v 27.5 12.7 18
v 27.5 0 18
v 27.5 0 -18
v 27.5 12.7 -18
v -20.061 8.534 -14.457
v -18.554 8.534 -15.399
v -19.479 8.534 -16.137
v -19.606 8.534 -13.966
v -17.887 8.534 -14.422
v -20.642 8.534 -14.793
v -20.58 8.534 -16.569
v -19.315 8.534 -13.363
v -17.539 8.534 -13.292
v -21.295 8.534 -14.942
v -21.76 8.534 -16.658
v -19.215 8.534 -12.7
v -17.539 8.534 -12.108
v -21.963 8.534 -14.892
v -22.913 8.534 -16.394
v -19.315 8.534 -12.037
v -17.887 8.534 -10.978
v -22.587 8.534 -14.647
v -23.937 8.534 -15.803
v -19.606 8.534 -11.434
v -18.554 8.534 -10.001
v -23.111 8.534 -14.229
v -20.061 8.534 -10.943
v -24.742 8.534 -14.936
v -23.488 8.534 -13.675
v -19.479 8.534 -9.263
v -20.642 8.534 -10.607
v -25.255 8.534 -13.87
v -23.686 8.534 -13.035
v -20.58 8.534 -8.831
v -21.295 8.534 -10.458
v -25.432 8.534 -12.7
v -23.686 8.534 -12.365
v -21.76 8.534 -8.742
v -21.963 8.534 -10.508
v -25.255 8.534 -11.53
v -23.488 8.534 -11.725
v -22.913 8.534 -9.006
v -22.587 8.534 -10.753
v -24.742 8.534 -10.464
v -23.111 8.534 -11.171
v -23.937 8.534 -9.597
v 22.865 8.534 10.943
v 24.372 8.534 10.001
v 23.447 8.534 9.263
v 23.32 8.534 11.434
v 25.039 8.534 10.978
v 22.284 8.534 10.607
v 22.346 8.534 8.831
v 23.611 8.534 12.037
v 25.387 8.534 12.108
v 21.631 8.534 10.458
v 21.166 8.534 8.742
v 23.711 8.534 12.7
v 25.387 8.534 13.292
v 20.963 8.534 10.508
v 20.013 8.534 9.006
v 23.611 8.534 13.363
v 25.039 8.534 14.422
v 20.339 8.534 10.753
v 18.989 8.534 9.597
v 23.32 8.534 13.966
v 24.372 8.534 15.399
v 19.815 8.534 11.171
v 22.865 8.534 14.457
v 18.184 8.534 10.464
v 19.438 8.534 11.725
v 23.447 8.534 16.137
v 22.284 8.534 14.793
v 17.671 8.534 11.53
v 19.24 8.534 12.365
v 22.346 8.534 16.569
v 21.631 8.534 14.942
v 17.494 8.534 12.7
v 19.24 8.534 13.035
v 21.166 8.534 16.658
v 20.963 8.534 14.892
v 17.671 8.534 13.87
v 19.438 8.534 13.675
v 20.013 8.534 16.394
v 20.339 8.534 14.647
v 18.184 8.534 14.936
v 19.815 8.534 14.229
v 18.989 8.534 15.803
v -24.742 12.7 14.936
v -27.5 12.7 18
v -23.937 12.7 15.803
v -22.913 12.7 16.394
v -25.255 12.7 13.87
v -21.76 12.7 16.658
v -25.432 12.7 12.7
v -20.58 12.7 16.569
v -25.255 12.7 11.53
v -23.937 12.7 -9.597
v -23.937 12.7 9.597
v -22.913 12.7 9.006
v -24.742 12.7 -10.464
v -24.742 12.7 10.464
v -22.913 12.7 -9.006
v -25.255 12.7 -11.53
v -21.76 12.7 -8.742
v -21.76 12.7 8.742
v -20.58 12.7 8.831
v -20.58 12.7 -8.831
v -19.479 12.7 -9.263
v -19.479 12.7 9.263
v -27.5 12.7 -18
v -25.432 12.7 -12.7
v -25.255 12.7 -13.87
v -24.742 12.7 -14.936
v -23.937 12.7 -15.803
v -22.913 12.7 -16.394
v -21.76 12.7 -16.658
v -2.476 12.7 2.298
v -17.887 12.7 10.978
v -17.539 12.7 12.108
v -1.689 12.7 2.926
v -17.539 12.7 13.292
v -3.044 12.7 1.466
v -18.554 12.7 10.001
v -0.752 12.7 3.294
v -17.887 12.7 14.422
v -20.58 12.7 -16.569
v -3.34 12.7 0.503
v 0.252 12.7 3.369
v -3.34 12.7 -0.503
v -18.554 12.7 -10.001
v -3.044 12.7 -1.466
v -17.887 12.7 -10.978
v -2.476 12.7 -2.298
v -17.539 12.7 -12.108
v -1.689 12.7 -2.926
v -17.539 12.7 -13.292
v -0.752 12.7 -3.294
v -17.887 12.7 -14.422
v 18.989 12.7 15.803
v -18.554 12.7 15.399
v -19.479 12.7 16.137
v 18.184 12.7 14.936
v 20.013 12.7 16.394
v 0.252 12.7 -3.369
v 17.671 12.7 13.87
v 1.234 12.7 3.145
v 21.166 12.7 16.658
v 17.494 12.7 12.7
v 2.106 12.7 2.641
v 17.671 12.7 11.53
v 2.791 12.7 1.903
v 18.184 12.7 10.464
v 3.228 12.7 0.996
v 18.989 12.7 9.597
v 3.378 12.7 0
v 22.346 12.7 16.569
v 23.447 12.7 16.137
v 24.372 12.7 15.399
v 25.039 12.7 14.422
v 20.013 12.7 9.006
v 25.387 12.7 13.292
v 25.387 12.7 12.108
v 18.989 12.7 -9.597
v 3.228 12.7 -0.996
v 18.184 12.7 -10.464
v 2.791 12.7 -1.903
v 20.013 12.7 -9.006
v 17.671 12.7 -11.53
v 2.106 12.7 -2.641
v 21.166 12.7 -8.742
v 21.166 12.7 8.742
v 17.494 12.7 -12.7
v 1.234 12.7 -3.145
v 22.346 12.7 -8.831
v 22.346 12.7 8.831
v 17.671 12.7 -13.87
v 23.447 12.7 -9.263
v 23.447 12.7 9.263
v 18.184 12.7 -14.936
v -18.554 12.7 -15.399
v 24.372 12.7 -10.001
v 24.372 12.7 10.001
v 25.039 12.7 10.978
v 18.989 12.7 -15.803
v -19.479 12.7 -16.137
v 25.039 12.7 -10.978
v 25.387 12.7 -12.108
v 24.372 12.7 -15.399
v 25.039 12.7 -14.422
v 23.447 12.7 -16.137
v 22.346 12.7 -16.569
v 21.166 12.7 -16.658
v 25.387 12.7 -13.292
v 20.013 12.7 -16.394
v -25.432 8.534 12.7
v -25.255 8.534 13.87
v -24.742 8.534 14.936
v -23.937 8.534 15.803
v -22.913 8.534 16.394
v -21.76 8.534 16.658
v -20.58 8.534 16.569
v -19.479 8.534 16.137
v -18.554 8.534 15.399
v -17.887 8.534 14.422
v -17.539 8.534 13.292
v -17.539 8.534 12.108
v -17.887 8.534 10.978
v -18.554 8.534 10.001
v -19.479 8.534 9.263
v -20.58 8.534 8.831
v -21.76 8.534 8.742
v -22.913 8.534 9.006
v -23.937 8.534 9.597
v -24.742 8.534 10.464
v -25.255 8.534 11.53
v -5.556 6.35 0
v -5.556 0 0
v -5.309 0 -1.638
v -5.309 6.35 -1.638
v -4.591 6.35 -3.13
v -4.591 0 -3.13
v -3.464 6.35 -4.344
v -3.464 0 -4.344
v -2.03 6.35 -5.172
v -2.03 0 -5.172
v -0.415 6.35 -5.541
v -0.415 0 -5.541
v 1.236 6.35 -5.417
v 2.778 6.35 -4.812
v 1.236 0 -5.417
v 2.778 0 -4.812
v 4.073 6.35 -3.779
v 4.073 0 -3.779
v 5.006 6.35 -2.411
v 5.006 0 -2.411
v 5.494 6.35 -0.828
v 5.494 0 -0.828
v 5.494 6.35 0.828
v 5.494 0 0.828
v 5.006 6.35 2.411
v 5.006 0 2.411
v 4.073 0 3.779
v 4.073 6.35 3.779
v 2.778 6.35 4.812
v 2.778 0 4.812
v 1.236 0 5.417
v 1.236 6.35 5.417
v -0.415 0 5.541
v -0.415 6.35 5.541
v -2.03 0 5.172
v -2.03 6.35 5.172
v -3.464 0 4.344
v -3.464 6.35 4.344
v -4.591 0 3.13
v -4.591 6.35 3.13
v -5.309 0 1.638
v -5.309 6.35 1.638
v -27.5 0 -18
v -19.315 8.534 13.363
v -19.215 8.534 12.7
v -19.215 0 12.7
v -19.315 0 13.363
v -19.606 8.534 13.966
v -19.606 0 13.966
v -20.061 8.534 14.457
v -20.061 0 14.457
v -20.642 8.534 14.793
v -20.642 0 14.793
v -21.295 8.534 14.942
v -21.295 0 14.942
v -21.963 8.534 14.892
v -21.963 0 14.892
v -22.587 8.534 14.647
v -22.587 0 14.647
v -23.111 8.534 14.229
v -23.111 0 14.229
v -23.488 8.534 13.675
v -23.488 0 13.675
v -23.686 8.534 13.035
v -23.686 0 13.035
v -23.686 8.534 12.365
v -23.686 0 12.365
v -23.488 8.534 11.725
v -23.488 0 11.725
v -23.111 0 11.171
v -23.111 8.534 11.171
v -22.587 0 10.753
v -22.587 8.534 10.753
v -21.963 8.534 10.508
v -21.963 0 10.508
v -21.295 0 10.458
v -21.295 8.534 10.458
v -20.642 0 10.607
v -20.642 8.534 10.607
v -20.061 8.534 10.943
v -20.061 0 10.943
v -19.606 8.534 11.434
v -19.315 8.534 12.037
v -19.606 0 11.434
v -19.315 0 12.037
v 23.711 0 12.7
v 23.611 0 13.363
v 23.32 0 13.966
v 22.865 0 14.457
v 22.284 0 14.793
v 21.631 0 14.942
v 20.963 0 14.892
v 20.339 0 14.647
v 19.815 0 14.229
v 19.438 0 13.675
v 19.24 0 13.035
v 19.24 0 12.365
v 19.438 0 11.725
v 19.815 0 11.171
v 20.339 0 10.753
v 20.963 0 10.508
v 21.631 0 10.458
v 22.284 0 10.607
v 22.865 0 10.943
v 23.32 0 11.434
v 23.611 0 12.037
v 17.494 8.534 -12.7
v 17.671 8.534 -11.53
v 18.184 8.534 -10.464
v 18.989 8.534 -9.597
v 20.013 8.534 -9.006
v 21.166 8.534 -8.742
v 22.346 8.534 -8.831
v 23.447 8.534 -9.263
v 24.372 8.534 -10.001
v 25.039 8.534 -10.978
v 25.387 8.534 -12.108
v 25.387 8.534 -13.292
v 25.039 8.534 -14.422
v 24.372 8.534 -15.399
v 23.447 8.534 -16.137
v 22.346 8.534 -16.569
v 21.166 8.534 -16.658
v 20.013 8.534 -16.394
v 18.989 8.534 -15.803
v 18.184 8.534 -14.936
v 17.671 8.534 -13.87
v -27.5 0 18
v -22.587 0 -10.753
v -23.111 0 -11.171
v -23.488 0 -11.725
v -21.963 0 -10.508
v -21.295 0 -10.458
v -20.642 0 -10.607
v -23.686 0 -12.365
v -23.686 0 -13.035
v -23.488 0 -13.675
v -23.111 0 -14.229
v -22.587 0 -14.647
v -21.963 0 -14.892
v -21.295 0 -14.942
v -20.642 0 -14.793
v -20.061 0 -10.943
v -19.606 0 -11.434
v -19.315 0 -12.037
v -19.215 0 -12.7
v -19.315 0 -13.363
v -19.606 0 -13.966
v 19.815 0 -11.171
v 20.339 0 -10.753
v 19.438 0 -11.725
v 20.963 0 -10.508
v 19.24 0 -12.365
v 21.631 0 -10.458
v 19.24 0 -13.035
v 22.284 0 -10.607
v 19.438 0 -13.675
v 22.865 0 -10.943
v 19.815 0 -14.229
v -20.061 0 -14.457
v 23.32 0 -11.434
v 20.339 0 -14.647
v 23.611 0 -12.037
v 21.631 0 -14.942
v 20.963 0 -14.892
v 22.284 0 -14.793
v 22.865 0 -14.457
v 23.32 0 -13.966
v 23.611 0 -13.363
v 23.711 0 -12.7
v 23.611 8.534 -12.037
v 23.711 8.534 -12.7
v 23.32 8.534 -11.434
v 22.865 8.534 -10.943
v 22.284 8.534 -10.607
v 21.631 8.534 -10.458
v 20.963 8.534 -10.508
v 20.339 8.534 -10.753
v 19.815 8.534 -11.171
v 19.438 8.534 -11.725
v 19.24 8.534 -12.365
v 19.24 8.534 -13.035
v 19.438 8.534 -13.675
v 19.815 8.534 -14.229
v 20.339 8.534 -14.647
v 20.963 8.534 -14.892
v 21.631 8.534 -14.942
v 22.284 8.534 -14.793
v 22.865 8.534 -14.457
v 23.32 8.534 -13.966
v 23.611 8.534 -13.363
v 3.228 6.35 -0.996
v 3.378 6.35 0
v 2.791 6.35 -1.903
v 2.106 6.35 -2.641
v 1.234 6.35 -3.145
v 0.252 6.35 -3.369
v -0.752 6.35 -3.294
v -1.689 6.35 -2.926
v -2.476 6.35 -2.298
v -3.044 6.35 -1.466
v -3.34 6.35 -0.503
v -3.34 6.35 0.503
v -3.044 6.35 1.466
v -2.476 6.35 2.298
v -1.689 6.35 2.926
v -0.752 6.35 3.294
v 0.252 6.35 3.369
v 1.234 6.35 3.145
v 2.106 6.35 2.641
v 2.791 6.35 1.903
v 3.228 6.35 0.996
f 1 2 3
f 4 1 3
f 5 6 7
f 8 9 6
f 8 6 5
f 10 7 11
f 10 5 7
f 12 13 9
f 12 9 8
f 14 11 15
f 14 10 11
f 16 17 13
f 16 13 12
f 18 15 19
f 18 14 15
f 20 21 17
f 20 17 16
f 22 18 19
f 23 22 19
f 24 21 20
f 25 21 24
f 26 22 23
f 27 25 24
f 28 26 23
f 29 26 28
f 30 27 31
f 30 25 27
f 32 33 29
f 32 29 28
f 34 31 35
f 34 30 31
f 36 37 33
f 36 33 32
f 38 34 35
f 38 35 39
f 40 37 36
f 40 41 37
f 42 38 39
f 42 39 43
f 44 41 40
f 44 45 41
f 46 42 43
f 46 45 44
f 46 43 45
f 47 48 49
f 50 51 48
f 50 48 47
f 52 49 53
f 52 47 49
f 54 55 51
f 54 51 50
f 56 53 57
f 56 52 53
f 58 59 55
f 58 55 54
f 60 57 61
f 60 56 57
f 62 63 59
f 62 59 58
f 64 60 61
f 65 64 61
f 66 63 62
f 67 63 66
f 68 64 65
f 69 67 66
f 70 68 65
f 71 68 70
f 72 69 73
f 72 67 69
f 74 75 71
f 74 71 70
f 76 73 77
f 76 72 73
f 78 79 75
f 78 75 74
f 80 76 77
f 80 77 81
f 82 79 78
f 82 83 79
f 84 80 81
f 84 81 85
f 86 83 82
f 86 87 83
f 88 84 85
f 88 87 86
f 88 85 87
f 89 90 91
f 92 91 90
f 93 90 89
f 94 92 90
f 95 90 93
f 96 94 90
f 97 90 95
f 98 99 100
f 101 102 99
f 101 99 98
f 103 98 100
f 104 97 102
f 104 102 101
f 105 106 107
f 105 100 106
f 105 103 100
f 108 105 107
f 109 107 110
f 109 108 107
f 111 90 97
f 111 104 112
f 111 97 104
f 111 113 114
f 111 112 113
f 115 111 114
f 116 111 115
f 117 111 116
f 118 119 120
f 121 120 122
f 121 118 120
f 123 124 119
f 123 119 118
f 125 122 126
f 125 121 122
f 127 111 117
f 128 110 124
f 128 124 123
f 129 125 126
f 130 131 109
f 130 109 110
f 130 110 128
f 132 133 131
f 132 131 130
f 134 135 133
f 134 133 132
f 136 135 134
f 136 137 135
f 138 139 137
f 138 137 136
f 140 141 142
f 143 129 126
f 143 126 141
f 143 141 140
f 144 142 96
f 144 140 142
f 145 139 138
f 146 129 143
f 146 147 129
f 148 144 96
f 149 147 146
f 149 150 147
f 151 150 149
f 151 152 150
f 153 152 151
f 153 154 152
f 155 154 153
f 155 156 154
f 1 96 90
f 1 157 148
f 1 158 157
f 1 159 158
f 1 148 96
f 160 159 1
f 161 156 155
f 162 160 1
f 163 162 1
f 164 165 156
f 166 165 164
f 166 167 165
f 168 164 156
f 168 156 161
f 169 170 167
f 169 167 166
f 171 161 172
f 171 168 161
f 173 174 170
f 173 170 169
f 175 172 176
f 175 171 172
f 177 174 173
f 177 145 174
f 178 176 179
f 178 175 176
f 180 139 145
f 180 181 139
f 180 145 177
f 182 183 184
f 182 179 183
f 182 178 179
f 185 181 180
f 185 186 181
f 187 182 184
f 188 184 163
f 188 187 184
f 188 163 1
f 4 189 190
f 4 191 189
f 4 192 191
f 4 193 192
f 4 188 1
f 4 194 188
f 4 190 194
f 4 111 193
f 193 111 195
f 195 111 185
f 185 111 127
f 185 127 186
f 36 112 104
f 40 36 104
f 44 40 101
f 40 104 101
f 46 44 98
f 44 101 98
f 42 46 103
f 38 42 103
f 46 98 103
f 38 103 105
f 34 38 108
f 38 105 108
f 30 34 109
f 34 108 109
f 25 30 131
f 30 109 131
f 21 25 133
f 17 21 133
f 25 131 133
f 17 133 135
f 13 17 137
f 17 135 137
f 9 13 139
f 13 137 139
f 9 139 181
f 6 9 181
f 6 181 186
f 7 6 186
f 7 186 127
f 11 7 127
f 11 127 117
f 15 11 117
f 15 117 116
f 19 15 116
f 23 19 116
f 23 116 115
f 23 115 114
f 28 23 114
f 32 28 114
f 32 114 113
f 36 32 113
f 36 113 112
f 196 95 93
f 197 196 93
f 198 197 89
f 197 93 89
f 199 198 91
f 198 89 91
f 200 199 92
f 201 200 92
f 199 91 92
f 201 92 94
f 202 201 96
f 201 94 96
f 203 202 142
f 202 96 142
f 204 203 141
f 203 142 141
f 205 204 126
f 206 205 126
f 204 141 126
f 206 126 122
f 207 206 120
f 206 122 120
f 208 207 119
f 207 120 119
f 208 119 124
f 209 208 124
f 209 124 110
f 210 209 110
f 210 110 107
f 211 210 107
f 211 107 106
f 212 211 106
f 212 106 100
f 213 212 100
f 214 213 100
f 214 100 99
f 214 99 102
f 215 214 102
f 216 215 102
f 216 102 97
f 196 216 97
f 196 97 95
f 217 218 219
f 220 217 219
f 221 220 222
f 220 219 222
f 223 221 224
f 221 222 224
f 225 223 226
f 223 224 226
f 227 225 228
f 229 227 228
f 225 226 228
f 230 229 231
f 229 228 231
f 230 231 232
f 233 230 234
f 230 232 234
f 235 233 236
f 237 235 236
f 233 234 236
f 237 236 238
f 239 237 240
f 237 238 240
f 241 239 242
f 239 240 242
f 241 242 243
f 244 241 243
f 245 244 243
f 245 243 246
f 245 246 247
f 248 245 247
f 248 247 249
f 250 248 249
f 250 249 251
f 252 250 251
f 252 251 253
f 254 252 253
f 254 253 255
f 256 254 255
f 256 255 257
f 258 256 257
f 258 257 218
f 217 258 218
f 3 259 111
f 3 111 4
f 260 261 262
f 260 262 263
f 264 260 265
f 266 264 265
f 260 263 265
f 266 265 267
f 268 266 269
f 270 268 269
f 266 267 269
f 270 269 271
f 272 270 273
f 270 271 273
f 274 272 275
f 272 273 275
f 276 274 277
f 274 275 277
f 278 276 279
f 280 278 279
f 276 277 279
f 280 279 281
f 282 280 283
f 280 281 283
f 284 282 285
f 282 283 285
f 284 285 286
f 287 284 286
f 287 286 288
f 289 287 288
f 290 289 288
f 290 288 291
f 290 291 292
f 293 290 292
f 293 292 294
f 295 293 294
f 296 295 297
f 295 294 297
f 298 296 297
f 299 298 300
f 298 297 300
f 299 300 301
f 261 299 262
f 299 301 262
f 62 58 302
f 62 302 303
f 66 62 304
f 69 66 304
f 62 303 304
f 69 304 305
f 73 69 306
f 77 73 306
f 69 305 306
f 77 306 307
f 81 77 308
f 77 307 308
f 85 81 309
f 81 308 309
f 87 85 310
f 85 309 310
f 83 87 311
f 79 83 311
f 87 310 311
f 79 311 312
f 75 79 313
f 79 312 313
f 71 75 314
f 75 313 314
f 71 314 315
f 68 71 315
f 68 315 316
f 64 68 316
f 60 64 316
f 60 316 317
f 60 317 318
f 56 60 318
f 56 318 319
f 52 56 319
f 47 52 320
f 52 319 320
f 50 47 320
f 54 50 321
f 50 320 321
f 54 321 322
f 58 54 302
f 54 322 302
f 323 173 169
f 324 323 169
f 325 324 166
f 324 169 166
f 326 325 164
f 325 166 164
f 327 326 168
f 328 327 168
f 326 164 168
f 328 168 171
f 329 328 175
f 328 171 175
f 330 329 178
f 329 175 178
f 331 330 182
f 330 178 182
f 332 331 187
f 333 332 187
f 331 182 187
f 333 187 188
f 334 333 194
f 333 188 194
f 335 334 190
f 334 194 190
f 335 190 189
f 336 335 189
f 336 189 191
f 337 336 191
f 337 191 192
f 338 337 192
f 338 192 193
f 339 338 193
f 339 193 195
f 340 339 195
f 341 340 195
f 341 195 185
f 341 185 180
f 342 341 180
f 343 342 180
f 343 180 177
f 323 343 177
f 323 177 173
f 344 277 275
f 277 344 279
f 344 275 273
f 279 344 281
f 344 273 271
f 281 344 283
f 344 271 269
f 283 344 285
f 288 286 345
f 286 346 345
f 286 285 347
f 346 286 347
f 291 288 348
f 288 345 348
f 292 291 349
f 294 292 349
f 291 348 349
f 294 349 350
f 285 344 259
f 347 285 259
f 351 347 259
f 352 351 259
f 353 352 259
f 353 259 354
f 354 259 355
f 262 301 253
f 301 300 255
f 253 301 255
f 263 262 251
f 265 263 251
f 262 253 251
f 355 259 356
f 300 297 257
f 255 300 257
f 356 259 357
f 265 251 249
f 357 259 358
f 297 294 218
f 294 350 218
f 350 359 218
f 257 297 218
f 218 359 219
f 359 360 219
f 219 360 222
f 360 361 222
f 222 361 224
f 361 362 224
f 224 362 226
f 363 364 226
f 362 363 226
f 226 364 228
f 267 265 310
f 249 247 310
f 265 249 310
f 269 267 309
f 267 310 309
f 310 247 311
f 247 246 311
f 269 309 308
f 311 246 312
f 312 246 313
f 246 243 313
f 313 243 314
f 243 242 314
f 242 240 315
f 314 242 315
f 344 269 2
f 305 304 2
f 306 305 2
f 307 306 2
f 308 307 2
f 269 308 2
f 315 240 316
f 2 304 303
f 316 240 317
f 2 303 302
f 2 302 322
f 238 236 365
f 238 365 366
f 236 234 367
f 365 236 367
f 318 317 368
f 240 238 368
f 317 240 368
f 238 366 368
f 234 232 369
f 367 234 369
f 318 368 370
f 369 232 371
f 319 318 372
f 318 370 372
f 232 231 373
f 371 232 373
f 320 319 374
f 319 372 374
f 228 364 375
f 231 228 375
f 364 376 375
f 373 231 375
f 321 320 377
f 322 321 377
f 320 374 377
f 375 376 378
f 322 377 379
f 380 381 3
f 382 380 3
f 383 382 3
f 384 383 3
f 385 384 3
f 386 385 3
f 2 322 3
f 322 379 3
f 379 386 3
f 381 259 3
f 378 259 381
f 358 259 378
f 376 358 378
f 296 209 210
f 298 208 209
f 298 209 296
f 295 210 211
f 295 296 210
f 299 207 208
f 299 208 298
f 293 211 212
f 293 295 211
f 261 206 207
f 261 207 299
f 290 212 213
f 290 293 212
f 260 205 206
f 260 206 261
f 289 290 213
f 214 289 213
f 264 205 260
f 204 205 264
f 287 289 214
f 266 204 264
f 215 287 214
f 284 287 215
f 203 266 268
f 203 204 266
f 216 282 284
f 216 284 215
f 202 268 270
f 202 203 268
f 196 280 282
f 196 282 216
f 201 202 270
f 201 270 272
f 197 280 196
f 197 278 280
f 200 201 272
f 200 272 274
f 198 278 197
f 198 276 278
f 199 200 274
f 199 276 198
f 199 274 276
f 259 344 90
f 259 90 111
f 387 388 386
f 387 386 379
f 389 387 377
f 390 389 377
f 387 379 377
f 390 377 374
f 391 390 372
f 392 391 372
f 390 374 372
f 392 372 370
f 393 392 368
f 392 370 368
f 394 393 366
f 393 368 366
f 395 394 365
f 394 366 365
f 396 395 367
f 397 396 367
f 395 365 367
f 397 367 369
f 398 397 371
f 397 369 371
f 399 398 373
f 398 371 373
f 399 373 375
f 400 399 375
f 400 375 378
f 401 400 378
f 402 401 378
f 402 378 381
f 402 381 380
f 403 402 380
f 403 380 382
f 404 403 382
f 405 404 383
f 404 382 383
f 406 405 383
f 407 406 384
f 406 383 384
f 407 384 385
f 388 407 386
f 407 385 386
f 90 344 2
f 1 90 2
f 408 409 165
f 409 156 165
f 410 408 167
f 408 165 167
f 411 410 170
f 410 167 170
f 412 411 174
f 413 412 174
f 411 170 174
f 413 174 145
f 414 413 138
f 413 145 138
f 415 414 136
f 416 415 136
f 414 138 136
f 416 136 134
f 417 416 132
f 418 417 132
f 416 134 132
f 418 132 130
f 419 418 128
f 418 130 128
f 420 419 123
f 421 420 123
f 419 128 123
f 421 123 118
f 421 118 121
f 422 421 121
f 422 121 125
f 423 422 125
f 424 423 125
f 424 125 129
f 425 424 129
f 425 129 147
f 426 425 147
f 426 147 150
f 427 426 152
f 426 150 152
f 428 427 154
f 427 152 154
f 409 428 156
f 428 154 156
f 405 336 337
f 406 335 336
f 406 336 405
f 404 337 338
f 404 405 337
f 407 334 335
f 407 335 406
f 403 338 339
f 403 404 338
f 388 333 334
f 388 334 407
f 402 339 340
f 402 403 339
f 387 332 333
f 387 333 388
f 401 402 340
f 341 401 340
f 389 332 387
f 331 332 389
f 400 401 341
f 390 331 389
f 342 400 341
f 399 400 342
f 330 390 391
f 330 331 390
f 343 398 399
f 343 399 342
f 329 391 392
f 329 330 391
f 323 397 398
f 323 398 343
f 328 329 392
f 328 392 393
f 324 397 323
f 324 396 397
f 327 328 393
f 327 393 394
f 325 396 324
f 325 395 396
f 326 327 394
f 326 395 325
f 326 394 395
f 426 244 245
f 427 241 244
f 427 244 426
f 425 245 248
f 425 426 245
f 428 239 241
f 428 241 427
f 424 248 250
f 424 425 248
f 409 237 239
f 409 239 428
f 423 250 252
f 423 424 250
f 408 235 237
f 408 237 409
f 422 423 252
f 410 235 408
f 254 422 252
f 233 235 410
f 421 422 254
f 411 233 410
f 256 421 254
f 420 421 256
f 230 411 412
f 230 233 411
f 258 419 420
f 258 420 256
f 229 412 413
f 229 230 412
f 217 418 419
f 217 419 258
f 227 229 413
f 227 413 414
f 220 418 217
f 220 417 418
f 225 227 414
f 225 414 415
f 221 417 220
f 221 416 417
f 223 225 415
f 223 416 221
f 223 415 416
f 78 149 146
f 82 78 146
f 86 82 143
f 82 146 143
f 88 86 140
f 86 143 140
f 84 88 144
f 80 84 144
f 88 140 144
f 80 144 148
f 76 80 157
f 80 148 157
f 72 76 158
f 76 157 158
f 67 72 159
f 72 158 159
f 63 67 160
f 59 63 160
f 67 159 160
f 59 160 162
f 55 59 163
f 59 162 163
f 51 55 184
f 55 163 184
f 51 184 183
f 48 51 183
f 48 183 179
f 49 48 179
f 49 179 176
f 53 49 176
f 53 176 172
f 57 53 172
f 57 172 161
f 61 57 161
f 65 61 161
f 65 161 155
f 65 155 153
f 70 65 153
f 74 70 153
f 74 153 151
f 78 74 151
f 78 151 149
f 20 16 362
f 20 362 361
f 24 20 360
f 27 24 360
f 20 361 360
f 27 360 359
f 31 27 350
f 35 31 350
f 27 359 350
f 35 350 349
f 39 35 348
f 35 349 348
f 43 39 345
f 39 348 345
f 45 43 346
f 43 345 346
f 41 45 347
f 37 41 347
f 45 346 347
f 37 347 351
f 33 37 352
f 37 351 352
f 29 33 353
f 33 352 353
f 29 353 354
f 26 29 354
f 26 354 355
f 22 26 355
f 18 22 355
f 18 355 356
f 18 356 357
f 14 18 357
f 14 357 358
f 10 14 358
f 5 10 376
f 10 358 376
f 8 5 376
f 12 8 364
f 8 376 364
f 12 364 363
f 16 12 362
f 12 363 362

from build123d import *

# Parameters (mm, degrees)
SKETCH1_W                                        = 55
SKETCH1_H                                        = 36
BOSS_EXTRUDE1_DEPTH                              = 12.7
CBORE_FOR_8_SOCKET_HEAD_CAP_SCREW1_D             = 4.4958
CBORE_FOR_8_SOCKET_HEAD_CAP_SCREW1_CBORE_D       = 7.9375
CBORE_FOR_8_SOCKET_HEAD_CAP_SCREW1_CBORE_DEPTH   = 4.1656
CBORE_FOR_1_4_SOCKET_HEAD_CAP_SCREW1_D           = 6.7564
CBORE_FOR_1_4_SOCKET_HEAD_CAP_SCREW1_CBORE_D     = 11.1125
CBORE_FOR_1_4_SOCKET_HEAD_CAP_SCREW1_CBORE_DEPTH = 6.35


with BuildPart() as part:
    # Sketch1 → Boss-Extrude1 (new body)
    with BuildSketch(Plane(origin=(0, 0, 0), x_dir=(1, 0, 0), z_dir=(0, 1, 0))):
        Rectangle(SKETCH1_W, SKETCH1_H)
    extrude(amount=BOSS_EXTRUDE1_DEPTH)

    # CBORE for #8 Socket Head Cap Screw1 (through all)
    with Locations(Plane(origin=(0, 12.7, 0), x_dir=(-1, 0, 0), z_dir=(0, 1, 0))):
        with Locations((21.463, -12.7), (21.463, 12.7), (-21.463, 12.7), (-21.463, -12.7)):
            CounterBoreHole(CBORE_FOR_8_SOCKET_HEAD_CAP_SCREW1_D / 2, CBORE_FOR_8_SOCKET_HEAD_CAP_SCREW1_CBORE_D / 2, CBORE_FOR_8_SOCKET_HEAD_CAP_SCREW1_CBORE_DEPTH)

    # CBORE for 1/4 Socket Head Cap Screw1 (through all)
    with Locations(Plane(origin=(0, 0, 0), x_dir=(-1, 0, 0), z_dir=(0, -1, 0))):
        with Locations((0, 0)):
            CounterBoreHole(CBORE_FOR_1_4_SOCKET_HEAD_CAP_SCREW1_D / 2, CBORE_FOR_1_4_SOCKET_HEAD_CAP_SCREW1_CBORE_D / 2, CBORE_FOR_1_4_SOCKET_HEAD_CAP_SCREW1_CBORE_DEPTH)


solid = part.part
